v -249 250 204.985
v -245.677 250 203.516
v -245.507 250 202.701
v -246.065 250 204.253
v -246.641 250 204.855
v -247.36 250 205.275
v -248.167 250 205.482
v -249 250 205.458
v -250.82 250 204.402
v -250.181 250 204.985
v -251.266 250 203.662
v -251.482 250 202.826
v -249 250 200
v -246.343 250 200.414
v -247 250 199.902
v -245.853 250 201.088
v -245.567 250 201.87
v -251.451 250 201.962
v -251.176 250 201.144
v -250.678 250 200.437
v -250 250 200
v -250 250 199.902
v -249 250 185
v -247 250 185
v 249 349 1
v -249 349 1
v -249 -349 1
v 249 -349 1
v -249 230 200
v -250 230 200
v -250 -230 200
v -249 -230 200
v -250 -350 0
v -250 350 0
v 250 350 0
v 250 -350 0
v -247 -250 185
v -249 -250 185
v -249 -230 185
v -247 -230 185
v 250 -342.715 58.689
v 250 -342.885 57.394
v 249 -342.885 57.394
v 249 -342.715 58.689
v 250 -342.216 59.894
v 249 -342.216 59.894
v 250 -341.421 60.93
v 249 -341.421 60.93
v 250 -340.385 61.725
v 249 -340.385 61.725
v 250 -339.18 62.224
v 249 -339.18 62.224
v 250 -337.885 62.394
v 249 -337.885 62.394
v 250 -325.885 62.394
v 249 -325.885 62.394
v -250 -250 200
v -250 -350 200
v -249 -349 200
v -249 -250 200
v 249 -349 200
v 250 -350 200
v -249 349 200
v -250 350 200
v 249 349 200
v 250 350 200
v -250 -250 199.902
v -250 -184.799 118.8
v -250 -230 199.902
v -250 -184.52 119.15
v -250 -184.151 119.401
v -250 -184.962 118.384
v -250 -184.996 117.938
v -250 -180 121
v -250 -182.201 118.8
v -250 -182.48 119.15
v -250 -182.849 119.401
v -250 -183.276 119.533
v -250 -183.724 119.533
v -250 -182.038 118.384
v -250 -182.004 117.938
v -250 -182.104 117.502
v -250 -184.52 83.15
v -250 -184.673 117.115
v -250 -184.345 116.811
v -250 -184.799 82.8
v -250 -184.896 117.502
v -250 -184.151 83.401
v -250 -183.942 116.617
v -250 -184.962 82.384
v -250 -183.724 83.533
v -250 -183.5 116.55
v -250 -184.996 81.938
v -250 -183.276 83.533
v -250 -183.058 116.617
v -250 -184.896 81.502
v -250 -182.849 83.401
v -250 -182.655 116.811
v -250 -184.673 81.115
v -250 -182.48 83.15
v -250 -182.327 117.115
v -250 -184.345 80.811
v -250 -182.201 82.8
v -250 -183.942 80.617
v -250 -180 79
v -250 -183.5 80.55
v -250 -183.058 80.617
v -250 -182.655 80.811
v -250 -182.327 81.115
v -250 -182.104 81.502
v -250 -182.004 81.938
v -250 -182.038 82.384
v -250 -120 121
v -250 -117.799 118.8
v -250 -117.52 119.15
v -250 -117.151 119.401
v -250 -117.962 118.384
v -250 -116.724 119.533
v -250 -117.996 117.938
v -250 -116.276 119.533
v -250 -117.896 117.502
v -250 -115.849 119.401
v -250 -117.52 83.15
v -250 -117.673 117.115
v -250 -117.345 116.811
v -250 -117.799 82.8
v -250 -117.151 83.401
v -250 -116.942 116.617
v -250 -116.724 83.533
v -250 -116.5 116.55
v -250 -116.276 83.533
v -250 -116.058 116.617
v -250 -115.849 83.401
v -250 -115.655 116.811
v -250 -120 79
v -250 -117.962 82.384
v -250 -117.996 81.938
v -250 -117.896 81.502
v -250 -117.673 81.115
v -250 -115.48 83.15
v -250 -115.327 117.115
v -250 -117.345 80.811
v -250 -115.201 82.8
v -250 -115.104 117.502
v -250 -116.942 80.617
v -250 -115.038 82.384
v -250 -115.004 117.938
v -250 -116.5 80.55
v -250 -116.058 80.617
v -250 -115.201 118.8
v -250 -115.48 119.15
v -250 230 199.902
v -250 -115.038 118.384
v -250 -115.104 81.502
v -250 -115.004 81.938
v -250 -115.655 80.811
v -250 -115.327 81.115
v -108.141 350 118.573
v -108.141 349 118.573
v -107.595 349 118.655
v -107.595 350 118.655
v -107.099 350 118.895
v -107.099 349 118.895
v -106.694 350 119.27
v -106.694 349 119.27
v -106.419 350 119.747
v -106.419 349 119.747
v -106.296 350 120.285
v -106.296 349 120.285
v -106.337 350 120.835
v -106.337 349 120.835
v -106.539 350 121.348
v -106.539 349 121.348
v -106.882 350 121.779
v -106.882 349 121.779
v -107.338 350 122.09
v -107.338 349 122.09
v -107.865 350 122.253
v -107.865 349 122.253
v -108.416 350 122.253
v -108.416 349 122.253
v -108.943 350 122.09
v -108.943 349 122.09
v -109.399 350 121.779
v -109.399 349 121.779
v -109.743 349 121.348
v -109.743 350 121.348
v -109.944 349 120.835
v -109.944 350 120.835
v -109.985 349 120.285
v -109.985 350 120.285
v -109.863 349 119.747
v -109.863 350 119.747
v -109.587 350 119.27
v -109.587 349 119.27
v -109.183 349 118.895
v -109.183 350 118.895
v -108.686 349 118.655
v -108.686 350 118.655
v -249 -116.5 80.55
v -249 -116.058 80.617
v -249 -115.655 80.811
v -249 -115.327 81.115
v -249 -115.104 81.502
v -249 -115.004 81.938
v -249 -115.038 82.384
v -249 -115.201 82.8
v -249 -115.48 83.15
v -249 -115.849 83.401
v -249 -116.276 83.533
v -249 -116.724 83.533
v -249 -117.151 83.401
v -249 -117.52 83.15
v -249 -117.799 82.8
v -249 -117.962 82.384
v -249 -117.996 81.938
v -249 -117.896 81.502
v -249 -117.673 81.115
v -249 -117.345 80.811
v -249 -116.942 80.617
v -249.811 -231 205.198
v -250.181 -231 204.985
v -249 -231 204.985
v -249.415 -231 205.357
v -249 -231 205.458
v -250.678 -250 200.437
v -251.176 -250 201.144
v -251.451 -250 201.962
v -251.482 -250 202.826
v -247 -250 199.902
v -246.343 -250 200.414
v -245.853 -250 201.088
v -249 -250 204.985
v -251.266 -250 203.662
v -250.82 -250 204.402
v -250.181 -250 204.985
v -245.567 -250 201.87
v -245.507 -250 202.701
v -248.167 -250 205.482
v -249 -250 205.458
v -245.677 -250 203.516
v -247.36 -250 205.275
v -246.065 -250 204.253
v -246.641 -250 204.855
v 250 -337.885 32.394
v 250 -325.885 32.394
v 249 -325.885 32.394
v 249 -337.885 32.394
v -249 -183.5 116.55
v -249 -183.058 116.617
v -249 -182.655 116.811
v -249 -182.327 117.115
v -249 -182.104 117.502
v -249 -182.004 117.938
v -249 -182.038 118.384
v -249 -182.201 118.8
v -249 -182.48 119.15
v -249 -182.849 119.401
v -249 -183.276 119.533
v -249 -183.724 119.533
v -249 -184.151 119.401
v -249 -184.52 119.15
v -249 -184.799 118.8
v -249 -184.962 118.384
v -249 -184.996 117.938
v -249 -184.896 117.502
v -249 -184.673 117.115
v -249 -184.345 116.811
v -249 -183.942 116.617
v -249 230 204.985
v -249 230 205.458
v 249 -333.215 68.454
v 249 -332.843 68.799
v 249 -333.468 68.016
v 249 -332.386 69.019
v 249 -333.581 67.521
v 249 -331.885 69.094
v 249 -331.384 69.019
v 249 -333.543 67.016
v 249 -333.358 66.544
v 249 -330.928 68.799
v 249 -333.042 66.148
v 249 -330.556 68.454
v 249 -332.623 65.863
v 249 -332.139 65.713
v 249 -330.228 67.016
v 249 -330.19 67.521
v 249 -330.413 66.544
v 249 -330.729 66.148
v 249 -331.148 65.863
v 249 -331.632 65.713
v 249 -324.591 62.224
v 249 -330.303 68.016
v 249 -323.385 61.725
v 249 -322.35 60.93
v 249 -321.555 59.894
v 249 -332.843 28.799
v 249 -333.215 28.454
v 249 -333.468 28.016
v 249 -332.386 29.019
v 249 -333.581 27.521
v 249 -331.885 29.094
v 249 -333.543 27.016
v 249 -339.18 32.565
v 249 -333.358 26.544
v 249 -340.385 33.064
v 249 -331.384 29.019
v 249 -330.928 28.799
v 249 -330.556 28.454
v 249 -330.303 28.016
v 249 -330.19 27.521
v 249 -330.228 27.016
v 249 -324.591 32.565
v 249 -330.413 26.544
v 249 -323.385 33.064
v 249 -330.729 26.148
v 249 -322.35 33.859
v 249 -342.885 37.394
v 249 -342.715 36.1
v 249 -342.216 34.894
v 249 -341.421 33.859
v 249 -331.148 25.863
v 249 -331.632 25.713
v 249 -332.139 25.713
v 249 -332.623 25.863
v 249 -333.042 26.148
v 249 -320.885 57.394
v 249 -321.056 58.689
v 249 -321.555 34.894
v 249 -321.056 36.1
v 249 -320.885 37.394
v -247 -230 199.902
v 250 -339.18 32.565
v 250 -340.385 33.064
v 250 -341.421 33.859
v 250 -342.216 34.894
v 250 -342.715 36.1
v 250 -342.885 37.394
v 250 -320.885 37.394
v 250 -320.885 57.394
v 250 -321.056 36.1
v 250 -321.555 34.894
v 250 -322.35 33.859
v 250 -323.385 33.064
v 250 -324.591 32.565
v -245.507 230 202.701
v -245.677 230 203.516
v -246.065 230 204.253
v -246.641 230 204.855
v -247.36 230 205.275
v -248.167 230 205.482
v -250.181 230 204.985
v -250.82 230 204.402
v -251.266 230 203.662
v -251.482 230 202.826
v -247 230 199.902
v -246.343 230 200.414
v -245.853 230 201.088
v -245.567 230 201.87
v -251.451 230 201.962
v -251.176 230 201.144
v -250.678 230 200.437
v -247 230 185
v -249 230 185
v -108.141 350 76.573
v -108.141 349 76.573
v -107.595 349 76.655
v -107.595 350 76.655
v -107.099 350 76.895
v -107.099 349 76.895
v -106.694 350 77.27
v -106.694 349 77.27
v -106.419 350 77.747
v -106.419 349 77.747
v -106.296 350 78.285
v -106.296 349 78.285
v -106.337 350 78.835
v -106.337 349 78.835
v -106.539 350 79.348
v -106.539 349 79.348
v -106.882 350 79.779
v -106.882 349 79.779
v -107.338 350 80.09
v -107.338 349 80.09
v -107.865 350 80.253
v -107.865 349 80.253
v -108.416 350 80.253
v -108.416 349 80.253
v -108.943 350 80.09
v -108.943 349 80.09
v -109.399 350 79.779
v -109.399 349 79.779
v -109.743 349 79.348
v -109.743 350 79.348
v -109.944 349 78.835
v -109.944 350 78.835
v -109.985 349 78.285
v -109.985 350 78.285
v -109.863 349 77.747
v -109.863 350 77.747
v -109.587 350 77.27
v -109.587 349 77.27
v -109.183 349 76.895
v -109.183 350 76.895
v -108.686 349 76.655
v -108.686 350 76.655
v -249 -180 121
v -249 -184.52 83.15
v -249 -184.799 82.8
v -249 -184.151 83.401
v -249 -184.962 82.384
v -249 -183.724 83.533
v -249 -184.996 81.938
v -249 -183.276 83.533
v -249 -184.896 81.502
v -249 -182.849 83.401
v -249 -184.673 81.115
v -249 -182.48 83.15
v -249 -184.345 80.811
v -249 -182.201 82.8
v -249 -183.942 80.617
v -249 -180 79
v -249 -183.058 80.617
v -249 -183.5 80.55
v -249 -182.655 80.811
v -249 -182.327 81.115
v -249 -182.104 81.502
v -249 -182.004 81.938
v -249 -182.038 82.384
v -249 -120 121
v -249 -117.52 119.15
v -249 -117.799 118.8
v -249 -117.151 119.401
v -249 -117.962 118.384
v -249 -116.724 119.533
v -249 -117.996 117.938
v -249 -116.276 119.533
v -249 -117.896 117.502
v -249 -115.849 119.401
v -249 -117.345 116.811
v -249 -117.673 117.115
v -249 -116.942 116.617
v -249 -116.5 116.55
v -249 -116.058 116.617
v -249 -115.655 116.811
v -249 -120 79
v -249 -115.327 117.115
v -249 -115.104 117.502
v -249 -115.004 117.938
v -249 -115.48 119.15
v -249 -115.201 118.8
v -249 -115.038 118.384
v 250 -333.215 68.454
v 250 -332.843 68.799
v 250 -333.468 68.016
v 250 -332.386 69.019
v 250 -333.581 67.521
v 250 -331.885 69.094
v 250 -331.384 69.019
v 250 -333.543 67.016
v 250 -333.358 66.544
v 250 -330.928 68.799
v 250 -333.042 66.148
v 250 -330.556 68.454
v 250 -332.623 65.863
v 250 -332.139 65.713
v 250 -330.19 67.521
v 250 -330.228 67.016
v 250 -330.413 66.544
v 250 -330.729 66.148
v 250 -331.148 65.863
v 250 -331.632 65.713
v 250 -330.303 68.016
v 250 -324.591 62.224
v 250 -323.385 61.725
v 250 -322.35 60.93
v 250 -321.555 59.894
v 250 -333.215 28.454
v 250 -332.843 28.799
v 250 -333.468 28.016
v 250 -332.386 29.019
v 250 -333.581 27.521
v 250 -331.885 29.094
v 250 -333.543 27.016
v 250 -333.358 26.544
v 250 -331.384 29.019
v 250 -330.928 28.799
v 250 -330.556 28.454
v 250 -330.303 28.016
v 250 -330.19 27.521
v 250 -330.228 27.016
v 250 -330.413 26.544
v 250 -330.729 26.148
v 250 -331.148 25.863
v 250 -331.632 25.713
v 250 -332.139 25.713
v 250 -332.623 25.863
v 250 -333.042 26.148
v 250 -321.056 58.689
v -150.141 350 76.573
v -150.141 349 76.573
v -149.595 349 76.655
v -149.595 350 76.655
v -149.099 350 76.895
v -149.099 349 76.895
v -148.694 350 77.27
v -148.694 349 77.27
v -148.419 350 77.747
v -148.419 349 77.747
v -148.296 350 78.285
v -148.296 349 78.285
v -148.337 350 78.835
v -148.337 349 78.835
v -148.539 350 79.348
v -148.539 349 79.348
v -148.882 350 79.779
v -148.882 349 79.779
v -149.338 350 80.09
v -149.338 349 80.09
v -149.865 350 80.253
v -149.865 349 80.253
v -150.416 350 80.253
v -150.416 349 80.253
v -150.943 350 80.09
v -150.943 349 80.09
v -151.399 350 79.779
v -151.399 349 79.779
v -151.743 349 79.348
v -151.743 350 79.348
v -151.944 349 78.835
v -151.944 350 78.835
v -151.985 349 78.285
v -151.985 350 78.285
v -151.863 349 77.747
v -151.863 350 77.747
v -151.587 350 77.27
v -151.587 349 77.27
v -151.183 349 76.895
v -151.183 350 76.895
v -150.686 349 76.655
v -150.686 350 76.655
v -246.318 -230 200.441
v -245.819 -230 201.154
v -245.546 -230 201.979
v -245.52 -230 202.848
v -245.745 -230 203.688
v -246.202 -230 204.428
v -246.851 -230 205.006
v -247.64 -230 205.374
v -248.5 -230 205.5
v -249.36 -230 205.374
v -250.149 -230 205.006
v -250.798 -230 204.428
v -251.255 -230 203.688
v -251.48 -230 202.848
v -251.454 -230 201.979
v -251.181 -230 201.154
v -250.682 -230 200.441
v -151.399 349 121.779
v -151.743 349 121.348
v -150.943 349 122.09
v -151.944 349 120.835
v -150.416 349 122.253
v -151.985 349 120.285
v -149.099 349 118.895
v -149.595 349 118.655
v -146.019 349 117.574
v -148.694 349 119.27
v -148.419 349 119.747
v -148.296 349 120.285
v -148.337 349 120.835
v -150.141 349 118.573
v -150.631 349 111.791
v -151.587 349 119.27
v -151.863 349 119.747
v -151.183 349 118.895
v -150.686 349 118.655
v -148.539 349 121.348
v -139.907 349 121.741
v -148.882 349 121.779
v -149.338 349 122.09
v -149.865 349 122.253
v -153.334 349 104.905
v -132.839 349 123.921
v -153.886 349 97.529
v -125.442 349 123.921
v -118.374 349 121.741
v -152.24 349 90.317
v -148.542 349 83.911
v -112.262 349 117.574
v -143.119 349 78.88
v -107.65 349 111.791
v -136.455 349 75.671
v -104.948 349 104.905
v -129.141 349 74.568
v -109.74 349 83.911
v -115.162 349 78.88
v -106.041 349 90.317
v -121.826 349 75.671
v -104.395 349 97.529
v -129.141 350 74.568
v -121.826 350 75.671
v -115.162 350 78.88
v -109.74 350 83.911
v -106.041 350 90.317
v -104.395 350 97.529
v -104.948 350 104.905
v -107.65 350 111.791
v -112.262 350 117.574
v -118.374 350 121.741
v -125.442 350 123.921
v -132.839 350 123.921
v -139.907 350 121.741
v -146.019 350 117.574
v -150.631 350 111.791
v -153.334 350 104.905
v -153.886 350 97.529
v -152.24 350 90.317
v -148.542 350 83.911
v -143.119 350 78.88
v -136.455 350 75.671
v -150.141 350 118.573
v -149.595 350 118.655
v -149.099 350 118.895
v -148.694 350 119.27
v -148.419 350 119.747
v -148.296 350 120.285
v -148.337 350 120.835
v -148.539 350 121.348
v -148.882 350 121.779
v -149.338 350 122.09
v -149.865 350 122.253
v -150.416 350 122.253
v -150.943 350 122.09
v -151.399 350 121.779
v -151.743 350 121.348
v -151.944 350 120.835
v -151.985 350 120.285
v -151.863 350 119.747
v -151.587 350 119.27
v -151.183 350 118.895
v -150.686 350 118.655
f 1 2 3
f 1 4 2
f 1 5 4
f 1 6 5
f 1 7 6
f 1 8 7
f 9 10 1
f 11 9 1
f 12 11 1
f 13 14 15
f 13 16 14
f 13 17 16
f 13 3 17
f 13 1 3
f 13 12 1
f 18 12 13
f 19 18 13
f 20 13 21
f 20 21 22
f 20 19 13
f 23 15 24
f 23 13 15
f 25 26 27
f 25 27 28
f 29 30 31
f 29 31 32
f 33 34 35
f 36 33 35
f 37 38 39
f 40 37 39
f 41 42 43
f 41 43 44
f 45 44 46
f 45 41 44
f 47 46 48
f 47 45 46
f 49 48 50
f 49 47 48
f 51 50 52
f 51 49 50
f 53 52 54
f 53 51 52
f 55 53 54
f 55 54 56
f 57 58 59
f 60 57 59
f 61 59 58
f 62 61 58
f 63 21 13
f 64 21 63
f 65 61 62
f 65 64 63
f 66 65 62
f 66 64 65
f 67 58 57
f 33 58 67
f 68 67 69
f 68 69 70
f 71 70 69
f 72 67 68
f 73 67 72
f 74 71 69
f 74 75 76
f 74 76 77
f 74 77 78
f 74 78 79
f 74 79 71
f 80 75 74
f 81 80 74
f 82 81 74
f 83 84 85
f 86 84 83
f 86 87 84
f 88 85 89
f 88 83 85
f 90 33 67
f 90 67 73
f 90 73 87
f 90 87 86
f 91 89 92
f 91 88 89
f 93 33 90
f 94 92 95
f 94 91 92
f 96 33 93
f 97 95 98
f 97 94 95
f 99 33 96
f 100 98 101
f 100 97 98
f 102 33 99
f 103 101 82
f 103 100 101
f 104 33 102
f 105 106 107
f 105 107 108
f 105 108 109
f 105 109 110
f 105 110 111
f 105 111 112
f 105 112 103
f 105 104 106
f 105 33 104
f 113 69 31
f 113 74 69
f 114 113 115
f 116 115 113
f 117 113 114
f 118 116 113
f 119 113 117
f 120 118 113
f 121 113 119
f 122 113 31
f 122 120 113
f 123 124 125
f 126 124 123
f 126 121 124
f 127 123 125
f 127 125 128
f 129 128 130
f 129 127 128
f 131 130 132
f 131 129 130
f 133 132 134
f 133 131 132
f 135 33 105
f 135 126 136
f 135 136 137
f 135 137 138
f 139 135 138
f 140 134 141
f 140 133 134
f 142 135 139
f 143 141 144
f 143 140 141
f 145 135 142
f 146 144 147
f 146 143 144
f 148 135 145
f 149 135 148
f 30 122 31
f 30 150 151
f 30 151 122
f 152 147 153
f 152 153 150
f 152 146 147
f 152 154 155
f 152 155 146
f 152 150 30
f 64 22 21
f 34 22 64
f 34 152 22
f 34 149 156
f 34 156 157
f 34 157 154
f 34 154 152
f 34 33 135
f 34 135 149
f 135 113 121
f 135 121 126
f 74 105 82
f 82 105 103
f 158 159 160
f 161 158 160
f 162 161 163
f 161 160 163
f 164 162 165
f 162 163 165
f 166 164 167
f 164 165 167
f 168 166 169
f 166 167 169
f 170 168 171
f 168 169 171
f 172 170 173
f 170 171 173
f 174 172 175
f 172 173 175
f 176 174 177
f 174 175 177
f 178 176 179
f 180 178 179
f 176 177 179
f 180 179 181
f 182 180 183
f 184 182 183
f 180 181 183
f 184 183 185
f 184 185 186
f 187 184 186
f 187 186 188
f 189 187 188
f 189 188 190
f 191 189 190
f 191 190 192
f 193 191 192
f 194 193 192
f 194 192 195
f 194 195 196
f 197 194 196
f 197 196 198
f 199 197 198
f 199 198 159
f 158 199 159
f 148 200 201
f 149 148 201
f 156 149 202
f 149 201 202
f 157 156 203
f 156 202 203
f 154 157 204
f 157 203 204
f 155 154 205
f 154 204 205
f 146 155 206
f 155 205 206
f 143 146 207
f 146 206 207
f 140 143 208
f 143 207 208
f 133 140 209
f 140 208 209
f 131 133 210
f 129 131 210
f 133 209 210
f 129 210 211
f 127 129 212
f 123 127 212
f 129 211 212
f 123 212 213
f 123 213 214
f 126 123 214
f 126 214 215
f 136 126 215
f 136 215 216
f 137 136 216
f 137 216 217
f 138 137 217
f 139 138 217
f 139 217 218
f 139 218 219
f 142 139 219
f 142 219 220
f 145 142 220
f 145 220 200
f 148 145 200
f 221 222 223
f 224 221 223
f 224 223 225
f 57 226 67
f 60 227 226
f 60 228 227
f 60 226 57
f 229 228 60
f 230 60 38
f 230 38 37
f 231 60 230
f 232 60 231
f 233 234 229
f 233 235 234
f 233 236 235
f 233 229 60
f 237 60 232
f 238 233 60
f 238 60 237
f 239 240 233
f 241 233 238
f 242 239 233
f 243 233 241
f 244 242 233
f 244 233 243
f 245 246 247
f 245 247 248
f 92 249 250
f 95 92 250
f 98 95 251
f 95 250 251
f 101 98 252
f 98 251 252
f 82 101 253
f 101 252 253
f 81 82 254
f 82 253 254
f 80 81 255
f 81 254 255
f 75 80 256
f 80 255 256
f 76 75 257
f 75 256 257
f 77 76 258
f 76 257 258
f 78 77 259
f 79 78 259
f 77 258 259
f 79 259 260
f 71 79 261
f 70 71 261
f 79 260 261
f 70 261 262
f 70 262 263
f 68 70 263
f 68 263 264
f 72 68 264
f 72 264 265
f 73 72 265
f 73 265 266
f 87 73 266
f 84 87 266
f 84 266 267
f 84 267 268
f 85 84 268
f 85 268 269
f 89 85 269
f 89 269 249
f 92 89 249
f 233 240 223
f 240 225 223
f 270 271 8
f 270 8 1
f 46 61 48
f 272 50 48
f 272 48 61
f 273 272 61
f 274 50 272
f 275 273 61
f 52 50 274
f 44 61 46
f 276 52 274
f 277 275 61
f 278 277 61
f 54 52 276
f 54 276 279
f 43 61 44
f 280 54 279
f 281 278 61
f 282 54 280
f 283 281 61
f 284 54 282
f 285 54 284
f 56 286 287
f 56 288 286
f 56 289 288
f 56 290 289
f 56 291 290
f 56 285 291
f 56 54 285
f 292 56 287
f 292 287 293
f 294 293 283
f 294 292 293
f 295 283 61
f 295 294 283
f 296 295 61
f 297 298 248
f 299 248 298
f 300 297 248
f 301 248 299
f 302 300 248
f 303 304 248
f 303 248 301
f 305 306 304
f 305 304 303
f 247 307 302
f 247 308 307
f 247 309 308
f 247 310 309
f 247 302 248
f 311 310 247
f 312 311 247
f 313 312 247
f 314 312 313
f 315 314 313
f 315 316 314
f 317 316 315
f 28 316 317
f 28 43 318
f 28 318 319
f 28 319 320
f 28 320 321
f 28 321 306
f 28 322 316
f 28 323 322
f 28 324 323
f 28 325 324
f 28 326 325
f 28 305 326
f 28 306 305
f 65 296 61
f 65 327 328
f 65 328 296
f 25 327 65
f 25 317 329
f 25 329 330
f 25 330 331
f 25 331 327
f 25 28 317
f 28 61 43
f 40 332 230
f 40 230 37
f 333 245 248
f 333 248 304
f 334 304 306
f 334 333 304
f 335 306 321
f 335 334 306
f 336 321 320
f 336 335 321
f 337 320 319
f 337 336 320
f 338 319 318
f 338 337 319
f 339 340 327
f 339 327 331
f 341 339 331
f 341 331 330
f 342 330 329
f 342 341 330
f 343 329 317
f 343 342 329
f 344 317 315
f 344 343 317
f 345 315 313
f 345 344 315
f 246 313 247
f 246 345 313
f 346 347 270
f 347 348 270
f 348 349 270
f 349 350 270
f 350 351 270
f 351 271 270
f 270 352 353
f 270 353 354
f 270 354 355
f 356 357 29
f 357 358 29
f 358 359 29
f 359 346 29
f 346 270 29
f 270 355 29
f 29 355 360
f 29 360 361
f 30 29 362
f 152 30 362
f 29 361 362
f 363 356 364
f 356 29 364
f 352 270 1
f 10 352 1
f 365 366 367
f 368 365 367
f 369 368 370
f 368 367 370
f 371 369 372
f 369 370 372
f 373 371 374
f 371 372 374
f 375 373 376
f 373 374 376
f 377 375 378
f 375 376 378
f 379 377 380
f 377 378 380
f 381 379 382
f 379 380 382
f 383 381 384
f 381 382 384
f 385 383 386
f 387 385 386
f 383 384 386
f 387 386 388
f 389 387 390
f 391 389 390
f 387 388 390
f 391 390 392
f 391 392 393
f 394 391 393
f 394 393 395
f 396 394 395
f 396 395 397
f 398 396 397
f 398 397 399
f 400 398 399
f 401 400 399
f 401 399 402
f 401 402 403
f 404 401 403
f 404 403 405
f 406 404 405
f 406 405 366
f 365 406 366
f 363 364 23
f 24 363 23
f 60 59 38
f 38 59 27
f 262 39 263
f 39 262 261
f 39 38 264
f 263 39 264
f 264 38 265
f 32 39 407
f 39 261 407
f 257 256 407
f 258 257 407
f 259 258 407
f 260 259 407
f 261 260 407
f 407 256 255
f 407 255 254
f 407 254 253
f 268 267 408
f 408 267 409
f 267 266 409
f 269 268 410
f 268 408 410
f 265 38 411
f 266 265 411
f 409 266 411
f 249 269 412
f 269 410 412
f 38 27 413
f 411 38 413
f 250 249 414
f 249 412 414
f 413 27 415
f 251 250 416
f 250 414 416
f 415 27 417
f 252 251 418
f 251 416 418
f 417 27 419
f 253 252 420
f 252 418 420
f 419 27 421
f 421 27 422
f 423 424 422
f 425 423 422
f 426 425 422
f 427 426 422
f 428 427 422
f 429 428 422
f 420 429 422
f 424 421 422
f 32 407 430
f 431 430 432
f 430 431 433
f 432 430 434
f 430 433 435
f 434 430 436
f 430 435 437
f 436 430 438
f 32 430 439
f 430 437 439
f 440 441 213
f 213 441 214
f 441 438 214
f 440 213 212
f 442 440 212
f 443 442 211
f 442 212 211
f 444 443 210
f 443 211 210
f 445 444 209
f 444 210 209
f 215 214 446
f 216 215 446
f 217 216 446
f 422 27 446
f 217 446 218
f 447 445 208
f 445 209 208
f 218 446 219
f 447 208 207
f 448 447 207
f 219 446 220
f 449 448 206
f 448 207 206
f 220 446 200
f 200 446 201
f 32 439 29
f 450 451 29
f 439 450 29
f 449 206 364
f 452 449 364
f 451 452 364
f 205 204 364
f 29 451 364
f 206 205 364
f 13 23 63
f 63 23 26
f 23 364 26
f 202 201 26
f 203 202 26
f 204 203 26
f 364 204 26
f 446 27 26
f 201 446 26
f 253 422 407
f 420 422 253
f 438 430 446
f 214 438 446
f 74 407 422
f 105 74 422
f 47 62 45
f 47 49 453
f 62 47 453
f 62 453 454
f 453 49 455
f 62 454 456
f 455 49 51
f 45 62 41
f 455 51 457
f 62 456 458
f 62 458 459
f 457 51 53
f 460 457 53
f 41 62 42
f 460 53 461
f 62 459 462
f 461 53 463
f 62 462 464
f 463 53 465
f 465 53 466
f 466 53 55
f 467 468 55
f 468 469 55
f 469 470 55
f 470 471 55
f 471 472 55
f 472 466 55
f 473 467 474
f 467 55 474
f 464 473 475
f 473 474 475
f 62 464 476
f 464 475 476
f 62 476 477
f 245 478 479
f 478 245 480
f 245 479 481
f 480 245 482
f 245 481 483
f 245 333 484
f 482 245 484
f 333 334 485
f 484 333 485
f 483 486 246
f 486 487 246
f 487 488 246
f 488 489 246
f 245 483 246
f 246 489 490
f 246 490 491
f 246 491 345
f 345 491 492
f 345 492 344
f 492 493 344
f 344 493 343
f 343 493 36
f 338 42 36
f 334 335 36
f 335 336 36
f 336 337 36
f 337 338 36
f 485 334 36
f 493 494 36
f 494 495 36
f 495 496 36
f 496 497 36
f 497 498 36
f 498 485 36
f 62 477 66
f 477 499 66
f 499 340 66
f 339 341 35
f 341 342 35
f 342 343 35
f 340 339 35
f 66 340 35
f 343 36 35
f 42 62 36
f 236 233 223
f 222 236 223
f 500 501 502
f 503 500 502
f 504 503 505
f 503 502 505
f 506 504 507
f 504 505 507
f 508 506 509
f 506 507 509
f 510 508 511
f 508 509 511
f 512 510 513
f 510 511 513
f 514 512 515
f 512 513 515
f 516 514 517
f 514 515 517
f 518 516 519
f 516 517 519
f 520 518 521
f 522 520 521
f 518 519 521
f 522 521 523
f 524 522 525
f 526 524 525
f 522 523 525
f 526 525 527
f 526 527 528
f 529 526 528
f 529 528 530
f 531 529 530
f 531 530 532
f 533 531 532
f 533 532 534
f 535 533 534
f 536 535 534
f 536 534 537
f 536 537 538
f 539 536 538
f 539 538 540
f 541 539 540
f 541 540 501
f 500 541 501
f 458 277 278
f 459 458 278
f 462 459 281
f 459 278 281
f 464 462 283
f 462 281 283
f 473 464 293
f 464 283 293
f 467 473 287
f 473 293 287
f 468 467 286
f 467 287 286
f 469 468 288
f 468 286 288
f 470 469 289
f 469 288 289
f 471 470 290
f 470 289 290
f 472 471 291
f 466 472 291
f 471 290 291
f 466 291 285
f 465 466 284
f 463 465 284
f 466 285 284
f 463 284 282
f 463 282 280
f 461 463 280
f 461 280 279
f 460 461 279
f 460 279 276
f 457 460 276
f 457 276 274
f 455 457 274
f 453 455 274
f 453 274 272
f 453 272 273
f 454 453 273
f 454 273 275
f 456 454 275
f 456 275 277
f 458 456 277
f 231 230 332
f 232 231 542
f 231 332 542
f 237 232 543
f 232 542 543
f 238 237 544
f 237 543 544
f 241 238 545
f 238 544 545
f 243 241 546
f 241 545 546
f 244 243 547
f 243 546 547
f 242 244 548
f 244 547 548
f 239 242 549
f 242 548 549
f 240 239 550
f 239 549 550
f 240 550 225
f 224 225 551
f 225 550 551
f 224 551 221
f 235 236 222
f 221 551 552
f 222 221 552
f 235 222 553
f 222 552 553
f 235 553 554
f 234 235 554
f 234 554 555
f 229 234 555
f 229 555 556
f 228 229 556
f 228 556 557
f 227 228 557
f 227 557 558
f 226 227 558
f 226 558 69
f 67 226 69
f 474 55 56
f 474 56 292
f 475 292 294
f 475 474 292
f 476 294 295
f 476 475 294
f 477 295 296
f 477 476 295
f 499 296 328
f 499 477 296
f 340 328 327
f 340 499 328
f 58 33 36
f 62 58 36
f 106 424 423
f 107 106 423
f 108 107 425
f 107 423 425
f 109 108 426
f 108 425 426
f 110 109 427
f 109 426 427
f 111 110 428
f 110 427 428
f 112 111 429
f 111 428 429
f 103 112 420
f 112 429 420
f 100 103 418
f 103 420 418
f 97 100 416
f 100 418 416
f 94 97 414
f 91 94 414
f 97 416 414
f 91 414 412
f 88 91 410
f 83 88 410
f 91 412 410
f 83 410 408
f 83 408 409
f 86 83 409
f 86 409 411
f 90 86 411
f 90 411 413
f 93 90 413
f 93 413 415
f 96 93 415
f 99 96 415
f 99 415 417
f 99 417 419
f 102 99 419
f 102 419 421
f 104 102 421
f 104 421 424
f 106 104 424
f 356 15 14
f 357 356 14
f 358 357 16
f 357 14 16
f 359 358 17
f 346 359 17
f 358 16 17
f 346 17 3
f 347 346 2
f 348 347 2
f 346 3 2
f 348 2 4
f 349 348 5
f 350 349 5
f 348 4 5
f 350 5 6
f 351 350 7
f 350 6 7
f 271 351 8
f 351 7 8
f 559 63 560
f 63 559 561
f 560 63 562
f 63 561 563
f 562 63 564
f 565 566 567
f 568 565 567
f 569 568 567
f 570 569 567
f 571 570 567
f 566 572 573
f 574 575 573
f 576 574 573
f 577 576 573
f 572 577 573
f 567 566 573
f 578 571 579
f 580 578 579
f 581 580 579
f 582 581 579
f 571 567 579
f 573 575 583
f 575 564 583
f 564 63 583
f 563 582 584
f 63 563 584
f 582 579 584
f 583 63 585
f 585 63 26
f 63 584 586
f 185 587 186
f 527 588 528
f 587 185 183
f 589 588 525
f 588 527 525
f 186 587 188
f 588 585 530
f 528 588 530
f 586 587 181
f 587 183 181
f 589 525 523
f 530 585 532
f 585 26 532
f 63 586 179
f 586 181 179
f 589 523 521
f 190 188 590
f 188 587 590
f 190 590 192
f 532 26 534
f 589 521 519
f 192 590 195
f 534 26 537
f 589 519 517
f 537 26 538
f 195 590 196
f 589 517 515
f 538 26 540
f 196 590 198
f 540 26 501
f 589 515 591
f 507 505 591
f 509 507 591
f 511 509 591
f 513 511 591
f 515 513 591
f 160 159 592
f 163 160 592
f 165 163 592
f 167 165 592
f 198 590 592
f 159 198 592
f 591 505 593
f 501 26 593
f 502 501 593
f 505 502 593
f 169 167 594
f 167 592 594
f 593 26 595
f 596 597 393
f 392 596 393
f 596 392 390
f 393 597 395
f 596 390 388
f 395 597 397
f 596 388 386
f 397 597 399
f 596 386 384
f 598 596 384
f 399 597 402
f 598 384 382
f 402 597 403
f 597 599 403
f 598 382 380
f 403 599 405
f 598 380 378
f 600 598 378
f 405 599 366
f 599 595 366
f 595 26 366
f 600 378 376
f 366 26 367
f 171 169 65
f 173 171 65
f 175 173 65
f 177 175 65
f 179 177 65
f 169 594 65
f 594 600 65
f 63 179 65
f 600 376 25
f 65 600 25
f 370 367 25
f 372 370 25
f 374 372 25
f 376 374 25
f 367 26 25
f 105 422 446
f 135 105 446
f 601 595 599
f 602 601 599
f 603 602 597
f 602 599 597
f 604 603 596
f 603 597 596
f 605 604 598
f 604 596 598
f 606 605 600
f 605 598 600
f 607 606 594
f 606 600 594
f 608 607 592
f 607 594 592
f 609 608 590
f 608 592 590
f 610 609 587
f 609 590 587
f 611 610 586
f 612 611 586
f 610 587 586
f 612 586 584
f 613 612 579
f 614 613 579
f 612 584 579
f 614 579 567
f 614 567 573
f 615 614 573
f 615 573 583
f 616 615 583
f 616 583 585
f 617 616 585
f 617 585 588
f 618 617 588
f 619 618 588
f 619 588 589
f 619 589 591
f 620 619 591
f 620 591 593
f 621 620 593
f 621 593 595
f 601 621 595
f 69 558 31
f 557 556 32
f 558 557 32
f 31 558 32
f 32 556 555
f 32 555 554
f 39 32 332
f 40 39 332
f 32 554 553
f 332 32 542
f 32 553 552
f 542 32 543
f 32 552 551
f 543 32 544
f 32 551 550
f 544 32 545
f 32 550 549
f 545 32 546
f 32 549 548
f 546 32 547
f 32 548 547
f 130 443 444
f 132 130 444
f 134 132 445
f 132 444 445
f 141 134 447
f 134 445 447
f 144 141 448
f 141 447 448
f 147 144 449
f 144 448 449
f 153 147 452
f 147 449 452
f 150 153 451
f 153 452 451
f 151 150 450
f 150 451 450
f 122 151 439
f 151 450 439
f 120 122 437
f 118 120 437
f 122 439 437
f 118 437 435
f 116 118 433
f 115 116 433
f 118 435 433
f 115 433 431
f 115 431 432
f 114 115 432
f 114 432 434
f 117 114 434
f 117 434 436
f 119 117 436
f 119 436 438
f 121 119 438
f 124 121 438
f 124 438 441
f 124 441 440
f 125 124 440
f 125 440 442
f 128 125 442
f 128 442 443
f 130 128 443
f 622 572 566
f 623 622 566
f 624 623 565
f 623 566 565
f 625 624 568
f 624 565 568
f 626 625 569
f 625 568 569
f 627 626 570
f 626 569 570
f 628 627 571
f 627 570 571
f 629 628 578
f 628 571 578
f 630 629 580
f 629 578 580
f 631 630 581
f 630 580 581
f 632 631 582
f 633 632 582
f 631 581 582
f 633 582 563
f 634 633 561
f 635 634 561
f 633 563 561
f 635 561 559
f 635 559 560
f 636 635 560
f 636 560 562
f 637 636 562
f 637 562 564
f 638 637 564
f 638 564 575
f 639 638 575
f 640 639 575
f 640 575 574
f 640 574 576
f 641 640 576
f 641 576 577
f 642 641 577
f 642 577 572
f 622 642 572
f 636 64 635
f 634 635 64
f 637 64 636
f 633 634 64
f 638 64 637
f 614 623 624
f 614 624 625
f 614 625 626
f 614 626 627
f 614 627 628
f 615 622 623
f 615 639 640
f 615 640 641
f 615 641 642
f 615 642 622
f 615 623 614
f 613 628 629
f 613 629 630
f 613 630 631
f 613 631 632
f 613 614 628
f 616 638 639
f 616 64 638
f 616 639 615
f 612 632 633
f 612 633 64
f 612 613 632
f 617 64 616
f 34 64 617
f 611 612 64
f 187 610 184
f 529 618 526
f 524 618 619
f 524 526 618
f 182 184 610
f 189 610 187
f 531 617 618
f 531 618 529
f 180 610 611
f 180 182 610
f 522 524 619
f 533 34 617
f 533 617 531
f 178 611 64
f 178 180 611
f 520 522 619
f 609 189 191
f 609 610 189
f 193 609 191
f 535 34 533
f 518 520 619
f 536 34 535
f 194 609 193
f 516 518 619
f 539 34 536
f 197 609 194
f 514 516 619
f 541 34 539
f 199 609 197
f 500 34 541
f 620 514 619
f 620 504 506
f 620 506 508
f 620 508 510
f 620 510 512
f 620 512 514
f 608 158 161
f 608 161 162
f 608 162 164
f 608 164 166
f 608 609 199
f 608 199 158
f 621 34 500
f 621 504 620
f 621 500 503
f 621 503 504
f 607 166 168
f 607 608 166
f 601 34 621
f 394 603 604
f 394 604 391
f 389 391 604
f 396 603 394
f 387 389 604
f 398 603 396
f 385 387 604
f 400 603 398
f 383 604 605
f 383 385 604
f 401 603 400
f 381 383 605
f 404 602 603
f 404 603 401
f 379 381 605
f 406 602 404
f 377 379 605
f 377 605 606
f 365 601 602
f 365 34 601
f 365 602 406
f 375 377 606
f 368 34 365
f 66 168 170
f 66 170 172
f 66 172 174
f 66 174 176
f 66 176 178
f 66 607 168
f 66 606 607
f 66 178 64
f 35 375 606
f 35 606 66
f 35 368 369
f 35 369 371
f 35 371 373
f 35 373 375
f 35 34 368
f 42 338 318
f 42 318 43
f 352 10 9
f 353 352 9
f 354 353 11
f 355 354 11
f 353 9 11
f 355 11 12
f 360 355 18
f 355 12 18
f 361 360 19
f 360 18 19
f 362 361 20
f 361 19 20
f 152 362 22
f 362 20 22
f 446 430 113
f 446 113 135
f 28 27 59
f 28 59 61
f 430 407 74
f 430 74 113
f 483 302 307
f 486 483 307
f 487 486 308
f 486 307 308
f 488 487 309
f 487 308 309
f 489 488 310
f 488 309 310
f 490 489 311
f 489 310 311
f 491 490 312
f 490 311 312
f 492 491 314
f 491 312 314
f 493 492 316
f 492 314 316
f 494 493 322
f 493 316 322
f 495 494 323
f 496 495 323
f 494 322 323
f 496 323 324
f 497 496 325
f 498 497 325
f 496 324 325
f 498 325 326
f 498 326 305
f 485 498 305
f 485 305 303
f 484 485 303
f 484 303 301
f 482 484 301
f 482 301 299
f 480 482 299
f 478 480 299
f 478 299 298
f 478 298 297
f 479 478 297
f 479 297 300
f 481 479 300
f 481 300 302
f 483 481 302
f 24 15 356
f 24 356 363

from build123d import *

# Parameters (mm, degrees)
CROQUIS1_W              = 500
CROQUIS1_H              = 700
SALIENTE_EXTRUIR1_DEPTH = 200
VACIADO1_T              = -1
CROQUIS2_W              = 15
CROQUIS2_H              = 20
SALIENTE_EXTRUIR2_DEPTH = 2
SALIENTE_EXTRUIR3_START = -20
CROQUIS3_R              = 3
SALIENTE_EXTRUIR3_DEPTH = 20
SALIENTE_EXTRUIR4_START = -20
SALIENTE_EXTRUIR4_DEPTH = 20
CROQUIS5_W              = 42
CROQUIS5_H              = 60
CORTAR_EXTRUIR1_DEPTH   = 10
CROQUIS6_R              = 1.5
CORTAR_EXTRUIR2_DEPTH   = 10
CORTAR_EXTRUIR3_DEPTH   = 10
CROQUIS8_R              = 1.7
CORTAR_EXTRUIR4_DEPTH   = 10
CROQUIS9_R              = 24.815
CROQUIS9_R_2            = 1.85
CORTAR_EXTRUIR5_DEPTH   = 10


with BuildPart() as part:
    # Croquis1 → Saliente-Extruir1 (new body)
    with BuildSketch(Plane.XY):
        Rectangle(CROQUIS1_W, CROQUIS1_H)
    extrude(amount=SALIENTE_EXTRUIR1_DEPTH)

    # Vaciado1
    vaciado1_openings = [part.faces().sort_by_distance(p)[0] for p in [
        (0, 0, 200),
    ]]
    offset(amount=VACIADO1_T, openings=vaciado1_openings, kind=Kind.INTERSECTION)

    # Croquis2 → Saliente-Extruir2 (add)
    with BuildSketch(Plane(origin=(-249, 0, 0), x_dir=(0, 0, -1), z_dir=(1, 0, 0))):
        with Locations((-192.5, 240)):
            Rectangle(CROQUIS2_W, CROQUIS2_H)
        with Locations((-192.5, -240)):
            Rectangle(CROQUIS2_W, CROQUIS2_H)
    extrude(amount=SALIENTE_EXTRUIR2_DEPTH)

    # Croquis3 → Saliente-Extruir3 (add)
    with BuildSketch(Plane.XZ.offset(250).offset(SALIENTE_EXTRUIR3_START)):
        with Locations((-248.5, 202.5)):
            Circle(CROQUIS3_R)
    extrude(amount=SALIENTE_EXTRUIR3_DEPTH)

    # Croquis4 → Saliente-Extruir4 (add)
    with BuildSketch(Plane.XZ.offset(-230).offset(SALIENTE_EXTRUIR4_START)):
        with BuildLine():
            Line((-250, 199.901923789), (-247, 199.901923789))
            ThreePointArc((-247, 199.901923789), (-248.5, 205.5), (-250, 199.901923789))
        make_face()
    extrude(amount=SALIENTE_EXTRUIR4_DEPTH)

    # Croquis5 → Cortar-Extruir1 (cut)
    with BuildSketch(Plane(origin=(-249, 0, 0), x_dir=(0, 0, -1), z_dir=(1, 0, 0))):
        with Locations((-100, -150)):
            Rectangle(CROQUIS5_W, CROQUIS5_H)
    extrude(amount=-CORTAR_EXTRUIR1_DEPTH, mode=Mode.SUBTRACT)

    # Croquis6 → Cortar-Extruir2 (cut)
    with BuildSketch(Plane(origin=(-249, 0, 0), x_dir=(0, 0, -1), z_dir=(1, 0, 0))):
        with Locations((-118.05, -116.5)):
            Circle(CROQUIS6_R)
        with Locations((-82.05, -116.5)):
            Circle(CROQUIS6_R)
        with Locations((-82.05, -183.5)):
            Circle(CROQUIS6_R)
        with Locations((-118.05, -183.5)):
            Circle(CROQUIS6_R)
        Polygon((-204.984566909, 349), (-205.984152301, 348), (-703.777677317, 348), (-703.777677317, -350), (-205.984152301, -350), (-204.984566909, -351), (-204.984566909, -231), (-219.978347783, -231), (-219.978347783, -211), (-204.984566909, -211), (-204.984566909, 209), (-219.978347783, 209), (-219.978347783, 229), (-204.984566909, 229), align=None)
    extrude(amount=-CORTAR_EXTRUIR2_DEPTH, mode=Mode.SUBTRACT)

    # Croquis7 → Cortar-Extruir3 (cut)
    with BuildSketch(Plane(origin=(250, 0, 0), x_dir=(0, 0, -1), z_dir=(1, 0, 0))):
        with BuildLine():
            Line((-37.394449056, -342.885415535), (-57.394449056, -342.885415535))
            ThreePointArc((-57.394449056, -342.885415535), (-60.929982962, -341.420949441), (-62.394449056, -337.885415535))
            Line((-62.394449056, -337.885415535), (-62.394449056, -325.885415535))
            ThreePointArc((-62.394449056, -325.885415535), (-60.929982962, -322.349881629), (-57.394449056, -320.885415535))
            Line((-57.394449056, -320.885415535), (-37.394449056, -320.885415535))
            ThreePointArc((-37.394449056, -320.885415535), (-33.85891515, -322.349881629), (-32.394449056, -325.885415535))
            Line((-32.394449056, -325.885415535), (-32.394449056, -337.885415535))
            ThreePointArc((-32.394449056, -337.885415535), (-33.85891515, -341.420949441), (-37.394449056, -342.885415535))
        make_face()
    extrude(amount=-CORTAR_EXTRUIR3_DEPTH, mode=Mode.SUBTRACT)

    # Croquis8 → Cortar-Extruir4 (cut)
    with BuildSketch(Plane.ZY.offset(-249)):
        with Locations((27.394449056, -331.885415535)):
            Circle(CROQUIS8_R)
        with Locations((67.394449056, -331.885415535)):
            Circle(CROQUIS8_R)
    extrude(amount=-CORTAR_EXTRUIR4_DEPTH, mode=Mode.SUBTRACT)

    # Croquis9 → Cortar-Extruir5 (cut)
    with BuildSketch(Plane.XZ.offset(-349)):
        with Locations(Location((-129.140668179, 99.383298184, 0), (0, 0, 270))):
            Circle(CROQUIS9_R)
        with Locations(Location((-150.140668179, 120.423298184, 0), (0, 0, 270))):
            Circle(CROQUIS9_R_2)
        with Locations(Location((-108.140668179, 120.423298184, 0), (0, 0, 270))):
            Circle(CROQUIS9_R_2)
        with Locations(Location((-150.140668179, 78.423298184, 0), (0, 0, 270))):
            Circle(CROQUIS9_R_2)
        with Locations(Location((-108.140668179, 78.423298184, 0), (0, 0, 270))):
            Circle(CROQUIS9_R_2)
    extrude(amount=-CORTAR_EXTRUIR5_DEPTH, mode=Mode.SUBTRACT)


solid = part.part
